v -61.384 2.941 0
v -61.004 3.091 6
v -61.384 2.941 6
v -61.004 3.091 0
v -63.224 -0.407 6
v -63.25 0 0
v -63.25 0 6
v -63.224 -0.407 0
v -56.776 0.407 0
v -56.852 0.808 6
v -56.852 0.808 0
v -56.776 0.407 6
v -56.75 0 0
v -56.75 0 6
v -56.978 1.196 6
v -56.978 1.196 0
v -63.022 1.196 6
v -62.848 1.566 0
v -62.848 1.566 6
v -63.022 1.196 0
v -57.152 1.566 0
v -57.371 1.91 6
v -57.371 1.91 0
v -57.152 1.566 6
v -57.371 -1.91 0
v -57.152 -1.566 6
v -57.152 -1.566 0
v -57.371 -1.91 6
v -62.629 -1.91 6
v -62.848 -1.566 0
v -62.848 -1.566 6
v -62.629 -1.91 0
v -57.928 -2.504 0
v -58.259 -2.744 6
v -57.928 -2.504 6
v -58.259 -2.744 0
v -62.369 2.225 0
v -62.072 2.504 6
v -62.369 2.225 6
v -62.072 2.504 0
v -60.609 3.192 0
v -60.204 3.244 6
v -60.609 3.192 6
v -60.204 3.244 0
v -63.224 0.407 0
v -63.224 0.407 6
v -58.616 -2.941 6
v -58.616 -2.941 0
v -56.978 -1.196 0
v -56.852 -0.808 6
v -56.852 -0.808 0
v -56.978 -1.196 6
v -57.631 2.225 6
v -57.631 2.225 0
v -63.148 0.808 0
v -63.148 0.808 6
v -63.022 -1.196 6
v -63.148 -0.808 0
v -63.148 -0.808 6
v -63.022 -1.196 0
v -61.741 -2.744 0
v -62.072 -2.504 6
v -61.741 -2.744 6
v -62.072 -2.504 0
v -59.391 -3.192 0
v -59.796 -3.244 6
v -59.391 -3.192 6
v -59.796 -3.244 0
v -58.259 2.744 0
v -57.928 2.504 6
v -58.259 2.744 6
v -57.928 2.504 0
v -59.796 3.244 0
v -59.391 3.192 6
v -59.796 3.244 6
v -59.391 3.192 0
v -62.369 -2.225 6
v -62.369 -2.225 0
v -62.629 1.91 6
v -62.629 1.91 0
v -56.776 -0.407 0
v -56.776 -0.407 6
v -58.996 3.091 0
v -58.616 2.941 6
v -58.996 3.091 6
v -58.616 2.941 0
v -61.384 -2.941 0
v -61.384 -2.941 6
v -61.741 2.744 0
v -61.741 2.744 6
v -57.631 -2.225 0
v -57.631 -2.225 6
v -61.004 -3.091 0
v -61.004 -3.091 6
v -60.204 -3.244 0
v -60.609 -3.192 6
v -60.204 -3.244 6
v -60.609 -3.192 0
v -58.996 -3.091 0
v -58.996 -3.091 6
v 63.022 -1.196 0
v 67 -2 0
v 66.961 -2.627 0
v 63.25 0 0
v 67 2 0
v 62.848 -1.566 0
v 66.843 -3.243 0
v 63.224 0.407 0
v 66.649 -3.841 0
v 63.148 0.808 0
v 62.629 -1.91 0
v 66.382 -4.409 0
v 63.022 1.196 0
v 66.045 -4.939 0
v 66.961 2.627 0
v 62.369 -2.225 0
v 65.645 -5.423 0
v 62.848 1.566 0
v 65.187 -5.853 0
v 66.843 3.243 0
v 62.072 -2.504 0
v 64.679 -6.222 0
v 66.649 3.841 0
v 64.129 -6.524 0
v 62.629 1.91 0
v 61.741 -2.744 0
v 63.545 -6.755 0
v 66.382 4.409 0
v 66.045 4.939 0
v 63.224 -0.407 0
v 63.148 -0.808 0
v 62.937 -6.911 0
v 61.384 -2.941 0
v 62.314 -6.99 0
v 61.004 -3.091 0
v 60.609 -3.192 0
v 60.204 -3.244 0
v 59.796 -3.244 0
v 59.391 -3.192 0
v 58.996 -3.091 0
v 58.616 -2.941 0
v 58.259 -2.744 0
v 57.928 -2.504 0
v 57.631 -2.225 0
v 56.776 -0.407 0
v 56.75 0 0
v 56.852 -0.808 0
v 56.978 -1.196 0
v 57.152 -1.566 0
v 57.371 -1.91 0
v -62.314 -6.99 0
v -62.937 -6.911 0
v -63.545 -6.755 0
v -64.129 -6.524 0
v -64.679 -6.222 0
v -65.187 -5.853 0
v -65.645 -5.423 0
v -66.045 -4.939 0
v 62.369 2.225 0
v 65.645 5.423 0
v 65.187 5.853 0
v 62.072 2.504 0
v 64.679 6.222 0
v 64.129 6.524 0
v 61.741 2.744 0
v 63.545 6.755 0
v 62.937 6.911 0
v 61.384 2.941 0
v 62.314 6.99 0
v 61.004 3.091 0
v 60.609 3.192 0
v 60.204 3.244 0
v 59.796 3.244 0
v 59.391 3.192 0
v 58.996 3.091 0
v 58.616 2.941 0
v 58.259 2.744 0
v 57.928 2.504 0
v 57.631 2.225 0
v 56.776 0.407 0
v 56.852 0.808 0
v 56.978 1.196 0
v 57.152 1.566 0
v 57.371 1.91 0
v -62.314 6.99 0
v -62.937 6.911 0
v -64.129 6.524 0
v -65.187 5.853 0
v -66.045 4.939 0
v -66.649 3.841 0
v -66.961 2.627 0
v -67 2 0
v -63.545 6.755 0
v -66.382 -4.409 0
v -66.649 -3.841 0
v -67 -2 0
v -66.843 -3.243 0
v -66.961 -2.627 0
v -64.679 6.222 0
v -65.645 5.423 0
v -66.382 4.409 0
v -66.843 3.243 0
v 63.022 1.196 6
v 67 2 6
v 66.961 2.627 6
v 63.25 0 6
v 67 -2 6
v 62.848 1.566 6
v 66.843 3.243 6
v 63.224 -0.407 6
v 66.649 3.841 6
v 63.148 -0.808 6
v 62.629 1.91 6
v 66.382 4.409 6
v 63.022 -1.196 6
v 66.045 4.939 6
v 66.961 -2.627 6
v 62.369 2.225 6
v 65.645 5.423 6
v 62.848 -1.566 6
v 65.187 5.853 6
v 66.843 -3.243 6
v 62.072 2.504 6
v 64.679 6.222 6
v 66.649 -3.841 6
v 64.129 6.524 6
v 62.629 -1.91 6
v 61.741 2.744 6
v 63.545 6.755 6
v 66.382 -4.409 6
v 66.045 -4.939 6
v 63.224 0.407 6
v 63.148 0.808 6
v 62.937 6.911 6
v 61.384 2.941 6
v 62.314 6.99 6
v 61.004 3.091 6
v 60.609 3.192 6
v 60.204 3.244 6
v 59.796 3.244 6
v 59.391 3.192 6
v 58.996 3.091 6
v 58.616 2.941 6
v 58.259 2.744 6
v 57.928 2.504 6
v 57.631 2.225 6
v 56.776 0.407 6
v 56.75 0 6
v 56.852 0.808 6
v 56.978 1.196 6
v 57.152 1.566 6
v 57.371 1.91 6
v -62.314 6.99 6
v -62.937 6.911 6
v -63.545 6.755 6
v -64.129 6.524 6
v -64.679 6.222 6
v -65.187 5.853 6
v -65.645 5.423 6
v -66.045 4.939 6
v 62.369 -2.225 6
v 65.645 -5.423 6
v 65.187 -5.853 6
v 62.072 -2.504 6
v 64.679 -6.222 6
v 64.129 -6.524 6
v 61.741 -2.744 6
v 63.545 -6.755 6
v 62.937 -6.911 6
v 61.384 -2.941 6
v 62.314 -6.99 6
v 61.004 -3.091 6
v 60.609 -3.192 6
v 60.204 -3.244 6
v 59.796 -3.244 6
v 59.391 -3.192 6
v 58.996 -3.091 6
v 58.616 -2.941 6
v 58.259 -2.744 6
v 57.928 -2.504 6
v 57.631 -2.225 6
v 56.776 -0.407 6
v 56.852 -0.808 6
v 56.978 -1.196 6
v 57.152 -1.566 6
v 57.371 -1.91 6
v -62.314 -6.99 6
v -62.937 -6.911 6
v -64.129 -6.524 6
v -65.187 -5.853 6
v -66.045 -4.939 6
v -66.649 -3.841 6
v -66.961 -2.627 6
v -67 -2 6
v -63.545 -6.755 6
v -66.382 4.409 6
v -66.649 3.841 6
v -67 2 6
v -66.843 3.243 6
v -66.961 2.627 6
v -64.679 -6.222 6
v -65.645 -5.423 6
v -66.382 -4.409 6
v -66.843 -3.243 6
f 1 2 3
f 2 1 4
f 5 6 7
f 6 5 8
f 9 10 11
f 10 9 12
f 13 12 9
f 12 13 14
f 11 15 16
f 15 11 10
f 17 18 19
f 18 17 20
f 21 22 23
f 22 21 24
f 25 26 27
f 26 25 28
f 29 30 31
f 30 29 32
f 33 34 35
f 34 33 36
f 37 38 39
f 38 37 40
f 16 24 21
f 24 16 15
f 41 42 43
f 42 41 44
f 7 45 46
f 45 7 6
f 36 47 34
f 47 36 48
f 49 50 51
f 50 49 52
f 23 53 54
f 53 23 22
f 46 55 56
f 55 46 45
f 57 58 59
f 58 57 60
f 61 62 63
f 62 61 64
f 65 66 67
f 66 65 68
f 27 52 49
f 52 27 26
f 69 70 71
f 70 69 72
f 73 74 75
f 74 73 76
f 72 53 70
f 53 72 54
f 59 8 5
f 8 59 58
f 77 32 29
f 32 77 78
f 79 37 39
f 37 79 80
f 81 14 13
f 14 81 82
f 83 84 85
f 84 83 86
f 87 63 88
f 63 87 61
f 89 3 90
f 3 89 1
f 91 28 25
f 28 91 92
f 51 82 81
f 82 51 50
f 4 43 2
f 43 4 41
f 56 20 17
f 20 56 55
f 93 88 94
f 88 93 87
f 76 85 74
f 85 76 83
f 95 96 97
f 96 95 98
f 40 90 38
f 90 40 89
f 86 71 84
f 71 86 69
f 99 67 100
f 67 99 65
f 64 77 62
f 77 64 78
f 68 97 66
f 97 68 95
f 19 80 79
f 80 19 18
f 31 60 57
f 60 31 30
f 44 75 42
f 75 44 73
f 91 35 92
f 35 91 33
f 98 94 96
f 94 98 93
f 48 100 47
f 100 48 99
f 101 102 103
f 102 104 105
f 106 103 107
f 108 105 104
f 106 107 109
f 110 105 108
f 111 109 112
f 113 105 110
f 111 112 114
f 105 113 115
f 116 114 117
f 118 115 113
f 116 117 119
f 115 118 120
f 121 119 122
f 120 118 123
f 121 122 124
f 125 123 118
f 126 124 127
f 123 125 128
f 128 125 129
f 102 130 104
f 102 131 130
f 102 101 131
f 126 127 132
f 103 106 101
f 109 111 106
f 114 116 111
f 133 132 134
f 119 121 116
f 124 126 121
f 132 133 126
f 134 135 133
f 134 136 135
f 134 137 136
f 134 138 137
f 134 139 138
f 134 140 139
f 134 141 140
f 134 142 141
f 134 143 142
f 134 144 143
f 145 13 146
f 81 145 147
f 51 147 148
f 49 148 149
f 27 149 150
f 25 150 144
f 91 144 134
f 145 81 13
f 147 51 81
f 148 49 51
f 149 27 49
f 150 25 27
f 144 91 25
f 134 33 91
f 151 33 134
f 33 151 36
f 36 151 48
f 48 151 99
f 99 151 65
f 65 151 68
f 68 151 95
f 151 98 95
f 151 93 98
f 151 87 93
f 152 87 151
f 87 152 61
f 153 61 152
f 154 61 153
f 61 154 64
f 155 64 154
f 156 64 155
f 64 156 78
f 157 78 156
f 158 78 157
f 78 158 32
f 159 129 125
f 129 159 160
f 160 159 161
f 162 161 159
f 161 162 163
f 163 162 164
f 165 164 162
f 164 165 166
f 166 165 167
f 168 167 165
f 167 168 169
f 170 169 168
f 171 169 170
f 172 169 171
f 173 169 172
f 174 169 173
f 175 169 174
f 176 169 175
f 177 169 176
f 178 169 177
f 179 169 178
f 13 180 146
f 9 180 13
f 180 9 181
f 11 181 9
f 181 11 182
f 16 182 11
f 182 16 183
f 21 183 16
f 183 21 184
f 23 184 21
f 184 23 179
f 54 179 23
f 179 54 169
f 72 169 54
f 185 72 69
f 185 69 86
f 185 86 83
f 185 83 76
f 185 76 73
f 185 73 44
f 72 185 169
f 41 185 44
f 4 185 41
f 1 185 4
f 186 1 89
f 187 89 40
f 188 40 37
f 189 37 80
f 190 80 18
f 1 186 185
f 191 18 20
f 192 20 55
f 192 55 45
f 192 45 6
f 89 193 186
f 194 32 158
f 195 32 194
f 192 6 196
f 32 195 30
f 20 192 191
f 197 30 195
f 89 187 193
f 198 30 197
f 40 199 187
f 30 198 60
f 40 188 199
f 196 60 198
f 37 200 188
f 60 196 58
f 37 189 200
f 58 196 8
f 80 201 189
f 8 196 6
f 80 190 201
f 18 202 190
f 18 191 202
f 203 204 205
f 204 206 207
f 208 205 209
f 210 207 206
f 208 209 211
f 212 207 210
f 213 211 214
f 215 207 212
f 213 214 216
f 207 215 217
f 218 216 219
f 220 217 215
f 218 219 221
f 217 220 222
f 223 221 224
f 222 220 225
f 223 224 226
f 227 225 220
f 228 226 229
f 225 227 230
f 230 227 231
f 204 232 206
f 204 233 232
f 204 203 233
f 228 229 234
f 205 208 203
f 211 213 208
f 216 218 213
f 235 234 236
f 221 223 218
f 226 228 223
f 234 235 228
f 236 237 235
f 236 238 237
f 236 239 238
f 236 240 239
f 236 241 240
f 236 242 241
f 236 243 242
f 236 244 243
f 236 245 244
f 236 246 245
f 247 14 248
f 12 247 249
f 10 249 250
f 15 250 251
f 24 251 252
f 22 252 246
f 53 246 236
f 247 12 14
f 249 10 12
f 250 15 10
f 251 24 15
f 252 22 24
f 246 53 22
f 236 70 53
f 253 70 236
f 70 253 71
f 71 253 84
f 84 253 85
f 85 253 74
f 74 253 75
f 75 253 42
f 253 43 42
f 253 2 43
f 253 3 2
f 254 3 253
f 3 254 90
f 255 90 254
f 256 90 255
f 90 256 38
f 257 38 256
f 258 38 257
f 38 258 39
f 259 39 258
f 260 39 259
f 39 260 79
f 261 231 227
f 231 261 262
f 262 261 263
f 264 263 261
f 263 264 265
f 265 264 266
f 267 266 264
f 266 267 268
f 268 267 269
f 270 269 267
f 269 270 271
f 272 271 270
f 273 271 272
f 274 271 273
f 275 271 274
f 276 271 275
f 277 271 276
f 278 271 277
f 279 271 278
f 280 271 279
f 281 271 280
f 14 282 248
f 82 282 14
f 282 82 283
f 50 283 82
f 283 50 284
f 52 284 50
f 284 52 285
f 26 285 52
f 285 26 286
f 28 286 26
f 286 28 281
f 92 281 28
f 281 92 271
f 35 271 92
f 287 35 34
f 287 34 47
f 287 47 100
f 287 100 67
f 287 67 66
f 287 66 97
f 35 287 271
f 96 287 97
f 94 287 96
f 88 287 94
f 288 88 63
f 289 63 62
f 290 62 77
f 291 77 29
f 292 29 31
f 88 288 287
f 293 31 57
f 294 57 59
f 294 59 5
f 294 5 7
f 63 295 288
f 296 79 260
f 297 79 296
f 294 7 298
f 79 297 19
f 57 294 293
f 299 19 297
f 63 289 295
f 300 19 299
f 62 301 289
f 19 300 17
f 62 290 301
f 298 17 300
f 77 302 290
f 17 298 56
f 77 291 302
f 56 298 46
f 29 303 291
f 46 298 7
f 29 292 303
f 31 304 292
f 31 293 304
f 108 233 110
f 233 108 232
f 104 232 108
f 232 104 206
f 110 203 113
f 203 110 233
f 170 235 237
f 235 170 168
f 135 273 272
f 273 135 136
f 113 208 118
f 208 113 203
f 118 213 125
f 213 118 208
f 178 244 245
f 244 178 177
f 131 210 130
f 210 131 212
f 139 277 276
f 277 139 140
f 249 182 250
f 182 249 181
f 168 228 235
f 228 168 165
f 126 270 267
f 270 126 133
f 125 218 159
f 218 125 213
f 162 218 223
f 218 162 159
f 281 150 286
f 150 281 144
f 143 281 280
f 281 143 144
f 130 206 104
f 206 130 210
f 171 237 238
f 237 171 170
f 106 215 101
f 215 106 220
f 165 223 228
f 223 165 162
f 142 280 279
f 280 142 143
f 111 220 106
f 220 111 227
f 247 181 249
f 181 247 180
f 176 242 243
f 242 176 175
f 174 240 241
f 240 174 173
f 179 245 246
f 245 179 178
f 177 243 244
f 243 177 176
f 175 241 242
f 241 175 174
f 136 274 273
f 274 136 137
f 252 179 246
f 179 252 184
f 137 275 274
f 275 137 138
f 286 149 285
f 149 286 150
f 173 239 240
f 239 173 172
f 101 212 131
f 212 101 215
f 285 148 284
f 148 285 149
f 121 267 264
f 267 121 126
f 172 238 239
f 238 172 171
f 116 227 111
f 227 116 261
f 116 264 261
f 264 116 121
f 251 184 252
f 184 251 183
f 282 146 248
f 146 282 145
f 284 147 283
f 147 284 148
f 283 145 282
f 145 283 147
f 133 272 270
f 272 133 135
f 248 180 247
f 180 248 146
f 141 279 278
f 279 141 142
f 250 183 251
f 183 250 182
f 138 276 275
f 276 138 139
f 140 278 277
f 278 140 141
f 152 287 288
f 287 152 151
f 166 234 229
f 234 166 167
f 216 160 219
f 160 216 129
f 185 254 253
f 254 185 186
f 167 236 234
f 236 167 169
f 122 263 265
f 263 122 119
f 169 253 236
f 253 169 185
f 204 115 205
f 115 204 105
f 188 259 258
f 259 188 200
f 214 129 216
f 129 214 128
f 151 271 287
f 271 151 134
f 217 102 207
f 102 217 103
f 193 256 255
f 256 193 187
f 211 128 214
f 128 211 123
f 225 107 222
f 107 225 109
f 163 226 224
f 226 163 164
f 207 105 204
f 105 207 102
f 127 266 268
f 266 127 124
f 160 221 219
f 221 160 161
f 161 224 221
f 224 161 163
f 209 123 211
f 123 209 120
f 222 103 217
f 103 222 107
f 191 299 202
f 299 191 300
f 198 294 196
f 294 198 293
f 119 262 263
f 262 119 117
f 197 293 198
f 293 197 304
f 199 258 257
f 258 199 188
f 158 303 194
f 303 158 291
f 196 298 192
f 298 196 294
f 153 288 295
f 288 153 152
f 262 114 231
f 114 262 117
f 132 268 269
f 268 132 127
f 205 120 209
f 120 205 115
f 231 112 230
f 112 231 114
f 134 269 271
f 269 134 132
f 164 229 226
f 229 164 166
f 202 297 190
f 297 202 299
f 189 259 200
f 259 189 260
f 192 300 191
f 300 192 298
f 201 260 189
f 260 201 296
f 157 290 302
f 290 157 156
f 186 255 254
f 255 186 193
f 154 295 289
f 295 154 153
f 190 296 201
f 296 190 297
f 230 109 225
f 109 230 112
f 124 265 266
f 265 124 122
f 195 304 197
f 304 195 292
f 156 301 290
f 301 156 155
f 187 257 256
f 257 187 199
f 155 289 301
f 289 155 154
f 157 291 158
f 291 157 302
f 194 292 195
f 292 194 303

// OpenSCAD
$fn = 50;


difference() {
	union() {
		hull() {
			translate(v = [-62.0000000000, 2.0000000000, 0]) {
				cylinder(h = 6, r = 5);
			}
			translate(v = [62.0000000000, 2.0000000000, 0]) {
				cylinder(h = 6, r = 5);
			}
			translate(v = [-62.0000000000, -2.0000000000, 0]) {
				cylinder(h = 6, r = 5);
			}
			translate(v = [62.0000000000, -2.0000000000, 0]) {
				cylinder(h = 6, r = 5);
			}
		}
	}
	union() {
		translate(v = [-60.0000000000, 0.0000000000, 0]) {
			cylinder(h = 6, r = 3.2500000000);
		}
		translate(v = [60.0000000000, 0.0000000000, 0]) {
			cylinder(h = 6, r = 3.2500000000);
		}
		translate(v = [-60.0000000000, 0.0000000000, 0]) {
			cylinder(h = 6, r = 1.8000000000);
		}
		translate(v = [60.0000000000, 0.0000000000, 0]) {
			cylinder(h = 6, r = 1.8000000000);
		}
		translate(v = [-60.0000000000, 0.0000000000, 0]) {
			cylinder(h = 6, r = 1.8000000000);
		}
		translate(v = [60.0000000000, 0.0000000000, 0]) {
			cylinder(h = 6, r = 1.8000000000);
		}
		translate(v = [-60.0000000000, 0.0000000000, 0]) {
			cylinder(h = 6, r = 1.8000000000);
		}
		translate(v = [60.0000000000, 0.0000000000, 0]) {
			cylinder(h = 6, r = 1.8000000000);
		}
	}
}
